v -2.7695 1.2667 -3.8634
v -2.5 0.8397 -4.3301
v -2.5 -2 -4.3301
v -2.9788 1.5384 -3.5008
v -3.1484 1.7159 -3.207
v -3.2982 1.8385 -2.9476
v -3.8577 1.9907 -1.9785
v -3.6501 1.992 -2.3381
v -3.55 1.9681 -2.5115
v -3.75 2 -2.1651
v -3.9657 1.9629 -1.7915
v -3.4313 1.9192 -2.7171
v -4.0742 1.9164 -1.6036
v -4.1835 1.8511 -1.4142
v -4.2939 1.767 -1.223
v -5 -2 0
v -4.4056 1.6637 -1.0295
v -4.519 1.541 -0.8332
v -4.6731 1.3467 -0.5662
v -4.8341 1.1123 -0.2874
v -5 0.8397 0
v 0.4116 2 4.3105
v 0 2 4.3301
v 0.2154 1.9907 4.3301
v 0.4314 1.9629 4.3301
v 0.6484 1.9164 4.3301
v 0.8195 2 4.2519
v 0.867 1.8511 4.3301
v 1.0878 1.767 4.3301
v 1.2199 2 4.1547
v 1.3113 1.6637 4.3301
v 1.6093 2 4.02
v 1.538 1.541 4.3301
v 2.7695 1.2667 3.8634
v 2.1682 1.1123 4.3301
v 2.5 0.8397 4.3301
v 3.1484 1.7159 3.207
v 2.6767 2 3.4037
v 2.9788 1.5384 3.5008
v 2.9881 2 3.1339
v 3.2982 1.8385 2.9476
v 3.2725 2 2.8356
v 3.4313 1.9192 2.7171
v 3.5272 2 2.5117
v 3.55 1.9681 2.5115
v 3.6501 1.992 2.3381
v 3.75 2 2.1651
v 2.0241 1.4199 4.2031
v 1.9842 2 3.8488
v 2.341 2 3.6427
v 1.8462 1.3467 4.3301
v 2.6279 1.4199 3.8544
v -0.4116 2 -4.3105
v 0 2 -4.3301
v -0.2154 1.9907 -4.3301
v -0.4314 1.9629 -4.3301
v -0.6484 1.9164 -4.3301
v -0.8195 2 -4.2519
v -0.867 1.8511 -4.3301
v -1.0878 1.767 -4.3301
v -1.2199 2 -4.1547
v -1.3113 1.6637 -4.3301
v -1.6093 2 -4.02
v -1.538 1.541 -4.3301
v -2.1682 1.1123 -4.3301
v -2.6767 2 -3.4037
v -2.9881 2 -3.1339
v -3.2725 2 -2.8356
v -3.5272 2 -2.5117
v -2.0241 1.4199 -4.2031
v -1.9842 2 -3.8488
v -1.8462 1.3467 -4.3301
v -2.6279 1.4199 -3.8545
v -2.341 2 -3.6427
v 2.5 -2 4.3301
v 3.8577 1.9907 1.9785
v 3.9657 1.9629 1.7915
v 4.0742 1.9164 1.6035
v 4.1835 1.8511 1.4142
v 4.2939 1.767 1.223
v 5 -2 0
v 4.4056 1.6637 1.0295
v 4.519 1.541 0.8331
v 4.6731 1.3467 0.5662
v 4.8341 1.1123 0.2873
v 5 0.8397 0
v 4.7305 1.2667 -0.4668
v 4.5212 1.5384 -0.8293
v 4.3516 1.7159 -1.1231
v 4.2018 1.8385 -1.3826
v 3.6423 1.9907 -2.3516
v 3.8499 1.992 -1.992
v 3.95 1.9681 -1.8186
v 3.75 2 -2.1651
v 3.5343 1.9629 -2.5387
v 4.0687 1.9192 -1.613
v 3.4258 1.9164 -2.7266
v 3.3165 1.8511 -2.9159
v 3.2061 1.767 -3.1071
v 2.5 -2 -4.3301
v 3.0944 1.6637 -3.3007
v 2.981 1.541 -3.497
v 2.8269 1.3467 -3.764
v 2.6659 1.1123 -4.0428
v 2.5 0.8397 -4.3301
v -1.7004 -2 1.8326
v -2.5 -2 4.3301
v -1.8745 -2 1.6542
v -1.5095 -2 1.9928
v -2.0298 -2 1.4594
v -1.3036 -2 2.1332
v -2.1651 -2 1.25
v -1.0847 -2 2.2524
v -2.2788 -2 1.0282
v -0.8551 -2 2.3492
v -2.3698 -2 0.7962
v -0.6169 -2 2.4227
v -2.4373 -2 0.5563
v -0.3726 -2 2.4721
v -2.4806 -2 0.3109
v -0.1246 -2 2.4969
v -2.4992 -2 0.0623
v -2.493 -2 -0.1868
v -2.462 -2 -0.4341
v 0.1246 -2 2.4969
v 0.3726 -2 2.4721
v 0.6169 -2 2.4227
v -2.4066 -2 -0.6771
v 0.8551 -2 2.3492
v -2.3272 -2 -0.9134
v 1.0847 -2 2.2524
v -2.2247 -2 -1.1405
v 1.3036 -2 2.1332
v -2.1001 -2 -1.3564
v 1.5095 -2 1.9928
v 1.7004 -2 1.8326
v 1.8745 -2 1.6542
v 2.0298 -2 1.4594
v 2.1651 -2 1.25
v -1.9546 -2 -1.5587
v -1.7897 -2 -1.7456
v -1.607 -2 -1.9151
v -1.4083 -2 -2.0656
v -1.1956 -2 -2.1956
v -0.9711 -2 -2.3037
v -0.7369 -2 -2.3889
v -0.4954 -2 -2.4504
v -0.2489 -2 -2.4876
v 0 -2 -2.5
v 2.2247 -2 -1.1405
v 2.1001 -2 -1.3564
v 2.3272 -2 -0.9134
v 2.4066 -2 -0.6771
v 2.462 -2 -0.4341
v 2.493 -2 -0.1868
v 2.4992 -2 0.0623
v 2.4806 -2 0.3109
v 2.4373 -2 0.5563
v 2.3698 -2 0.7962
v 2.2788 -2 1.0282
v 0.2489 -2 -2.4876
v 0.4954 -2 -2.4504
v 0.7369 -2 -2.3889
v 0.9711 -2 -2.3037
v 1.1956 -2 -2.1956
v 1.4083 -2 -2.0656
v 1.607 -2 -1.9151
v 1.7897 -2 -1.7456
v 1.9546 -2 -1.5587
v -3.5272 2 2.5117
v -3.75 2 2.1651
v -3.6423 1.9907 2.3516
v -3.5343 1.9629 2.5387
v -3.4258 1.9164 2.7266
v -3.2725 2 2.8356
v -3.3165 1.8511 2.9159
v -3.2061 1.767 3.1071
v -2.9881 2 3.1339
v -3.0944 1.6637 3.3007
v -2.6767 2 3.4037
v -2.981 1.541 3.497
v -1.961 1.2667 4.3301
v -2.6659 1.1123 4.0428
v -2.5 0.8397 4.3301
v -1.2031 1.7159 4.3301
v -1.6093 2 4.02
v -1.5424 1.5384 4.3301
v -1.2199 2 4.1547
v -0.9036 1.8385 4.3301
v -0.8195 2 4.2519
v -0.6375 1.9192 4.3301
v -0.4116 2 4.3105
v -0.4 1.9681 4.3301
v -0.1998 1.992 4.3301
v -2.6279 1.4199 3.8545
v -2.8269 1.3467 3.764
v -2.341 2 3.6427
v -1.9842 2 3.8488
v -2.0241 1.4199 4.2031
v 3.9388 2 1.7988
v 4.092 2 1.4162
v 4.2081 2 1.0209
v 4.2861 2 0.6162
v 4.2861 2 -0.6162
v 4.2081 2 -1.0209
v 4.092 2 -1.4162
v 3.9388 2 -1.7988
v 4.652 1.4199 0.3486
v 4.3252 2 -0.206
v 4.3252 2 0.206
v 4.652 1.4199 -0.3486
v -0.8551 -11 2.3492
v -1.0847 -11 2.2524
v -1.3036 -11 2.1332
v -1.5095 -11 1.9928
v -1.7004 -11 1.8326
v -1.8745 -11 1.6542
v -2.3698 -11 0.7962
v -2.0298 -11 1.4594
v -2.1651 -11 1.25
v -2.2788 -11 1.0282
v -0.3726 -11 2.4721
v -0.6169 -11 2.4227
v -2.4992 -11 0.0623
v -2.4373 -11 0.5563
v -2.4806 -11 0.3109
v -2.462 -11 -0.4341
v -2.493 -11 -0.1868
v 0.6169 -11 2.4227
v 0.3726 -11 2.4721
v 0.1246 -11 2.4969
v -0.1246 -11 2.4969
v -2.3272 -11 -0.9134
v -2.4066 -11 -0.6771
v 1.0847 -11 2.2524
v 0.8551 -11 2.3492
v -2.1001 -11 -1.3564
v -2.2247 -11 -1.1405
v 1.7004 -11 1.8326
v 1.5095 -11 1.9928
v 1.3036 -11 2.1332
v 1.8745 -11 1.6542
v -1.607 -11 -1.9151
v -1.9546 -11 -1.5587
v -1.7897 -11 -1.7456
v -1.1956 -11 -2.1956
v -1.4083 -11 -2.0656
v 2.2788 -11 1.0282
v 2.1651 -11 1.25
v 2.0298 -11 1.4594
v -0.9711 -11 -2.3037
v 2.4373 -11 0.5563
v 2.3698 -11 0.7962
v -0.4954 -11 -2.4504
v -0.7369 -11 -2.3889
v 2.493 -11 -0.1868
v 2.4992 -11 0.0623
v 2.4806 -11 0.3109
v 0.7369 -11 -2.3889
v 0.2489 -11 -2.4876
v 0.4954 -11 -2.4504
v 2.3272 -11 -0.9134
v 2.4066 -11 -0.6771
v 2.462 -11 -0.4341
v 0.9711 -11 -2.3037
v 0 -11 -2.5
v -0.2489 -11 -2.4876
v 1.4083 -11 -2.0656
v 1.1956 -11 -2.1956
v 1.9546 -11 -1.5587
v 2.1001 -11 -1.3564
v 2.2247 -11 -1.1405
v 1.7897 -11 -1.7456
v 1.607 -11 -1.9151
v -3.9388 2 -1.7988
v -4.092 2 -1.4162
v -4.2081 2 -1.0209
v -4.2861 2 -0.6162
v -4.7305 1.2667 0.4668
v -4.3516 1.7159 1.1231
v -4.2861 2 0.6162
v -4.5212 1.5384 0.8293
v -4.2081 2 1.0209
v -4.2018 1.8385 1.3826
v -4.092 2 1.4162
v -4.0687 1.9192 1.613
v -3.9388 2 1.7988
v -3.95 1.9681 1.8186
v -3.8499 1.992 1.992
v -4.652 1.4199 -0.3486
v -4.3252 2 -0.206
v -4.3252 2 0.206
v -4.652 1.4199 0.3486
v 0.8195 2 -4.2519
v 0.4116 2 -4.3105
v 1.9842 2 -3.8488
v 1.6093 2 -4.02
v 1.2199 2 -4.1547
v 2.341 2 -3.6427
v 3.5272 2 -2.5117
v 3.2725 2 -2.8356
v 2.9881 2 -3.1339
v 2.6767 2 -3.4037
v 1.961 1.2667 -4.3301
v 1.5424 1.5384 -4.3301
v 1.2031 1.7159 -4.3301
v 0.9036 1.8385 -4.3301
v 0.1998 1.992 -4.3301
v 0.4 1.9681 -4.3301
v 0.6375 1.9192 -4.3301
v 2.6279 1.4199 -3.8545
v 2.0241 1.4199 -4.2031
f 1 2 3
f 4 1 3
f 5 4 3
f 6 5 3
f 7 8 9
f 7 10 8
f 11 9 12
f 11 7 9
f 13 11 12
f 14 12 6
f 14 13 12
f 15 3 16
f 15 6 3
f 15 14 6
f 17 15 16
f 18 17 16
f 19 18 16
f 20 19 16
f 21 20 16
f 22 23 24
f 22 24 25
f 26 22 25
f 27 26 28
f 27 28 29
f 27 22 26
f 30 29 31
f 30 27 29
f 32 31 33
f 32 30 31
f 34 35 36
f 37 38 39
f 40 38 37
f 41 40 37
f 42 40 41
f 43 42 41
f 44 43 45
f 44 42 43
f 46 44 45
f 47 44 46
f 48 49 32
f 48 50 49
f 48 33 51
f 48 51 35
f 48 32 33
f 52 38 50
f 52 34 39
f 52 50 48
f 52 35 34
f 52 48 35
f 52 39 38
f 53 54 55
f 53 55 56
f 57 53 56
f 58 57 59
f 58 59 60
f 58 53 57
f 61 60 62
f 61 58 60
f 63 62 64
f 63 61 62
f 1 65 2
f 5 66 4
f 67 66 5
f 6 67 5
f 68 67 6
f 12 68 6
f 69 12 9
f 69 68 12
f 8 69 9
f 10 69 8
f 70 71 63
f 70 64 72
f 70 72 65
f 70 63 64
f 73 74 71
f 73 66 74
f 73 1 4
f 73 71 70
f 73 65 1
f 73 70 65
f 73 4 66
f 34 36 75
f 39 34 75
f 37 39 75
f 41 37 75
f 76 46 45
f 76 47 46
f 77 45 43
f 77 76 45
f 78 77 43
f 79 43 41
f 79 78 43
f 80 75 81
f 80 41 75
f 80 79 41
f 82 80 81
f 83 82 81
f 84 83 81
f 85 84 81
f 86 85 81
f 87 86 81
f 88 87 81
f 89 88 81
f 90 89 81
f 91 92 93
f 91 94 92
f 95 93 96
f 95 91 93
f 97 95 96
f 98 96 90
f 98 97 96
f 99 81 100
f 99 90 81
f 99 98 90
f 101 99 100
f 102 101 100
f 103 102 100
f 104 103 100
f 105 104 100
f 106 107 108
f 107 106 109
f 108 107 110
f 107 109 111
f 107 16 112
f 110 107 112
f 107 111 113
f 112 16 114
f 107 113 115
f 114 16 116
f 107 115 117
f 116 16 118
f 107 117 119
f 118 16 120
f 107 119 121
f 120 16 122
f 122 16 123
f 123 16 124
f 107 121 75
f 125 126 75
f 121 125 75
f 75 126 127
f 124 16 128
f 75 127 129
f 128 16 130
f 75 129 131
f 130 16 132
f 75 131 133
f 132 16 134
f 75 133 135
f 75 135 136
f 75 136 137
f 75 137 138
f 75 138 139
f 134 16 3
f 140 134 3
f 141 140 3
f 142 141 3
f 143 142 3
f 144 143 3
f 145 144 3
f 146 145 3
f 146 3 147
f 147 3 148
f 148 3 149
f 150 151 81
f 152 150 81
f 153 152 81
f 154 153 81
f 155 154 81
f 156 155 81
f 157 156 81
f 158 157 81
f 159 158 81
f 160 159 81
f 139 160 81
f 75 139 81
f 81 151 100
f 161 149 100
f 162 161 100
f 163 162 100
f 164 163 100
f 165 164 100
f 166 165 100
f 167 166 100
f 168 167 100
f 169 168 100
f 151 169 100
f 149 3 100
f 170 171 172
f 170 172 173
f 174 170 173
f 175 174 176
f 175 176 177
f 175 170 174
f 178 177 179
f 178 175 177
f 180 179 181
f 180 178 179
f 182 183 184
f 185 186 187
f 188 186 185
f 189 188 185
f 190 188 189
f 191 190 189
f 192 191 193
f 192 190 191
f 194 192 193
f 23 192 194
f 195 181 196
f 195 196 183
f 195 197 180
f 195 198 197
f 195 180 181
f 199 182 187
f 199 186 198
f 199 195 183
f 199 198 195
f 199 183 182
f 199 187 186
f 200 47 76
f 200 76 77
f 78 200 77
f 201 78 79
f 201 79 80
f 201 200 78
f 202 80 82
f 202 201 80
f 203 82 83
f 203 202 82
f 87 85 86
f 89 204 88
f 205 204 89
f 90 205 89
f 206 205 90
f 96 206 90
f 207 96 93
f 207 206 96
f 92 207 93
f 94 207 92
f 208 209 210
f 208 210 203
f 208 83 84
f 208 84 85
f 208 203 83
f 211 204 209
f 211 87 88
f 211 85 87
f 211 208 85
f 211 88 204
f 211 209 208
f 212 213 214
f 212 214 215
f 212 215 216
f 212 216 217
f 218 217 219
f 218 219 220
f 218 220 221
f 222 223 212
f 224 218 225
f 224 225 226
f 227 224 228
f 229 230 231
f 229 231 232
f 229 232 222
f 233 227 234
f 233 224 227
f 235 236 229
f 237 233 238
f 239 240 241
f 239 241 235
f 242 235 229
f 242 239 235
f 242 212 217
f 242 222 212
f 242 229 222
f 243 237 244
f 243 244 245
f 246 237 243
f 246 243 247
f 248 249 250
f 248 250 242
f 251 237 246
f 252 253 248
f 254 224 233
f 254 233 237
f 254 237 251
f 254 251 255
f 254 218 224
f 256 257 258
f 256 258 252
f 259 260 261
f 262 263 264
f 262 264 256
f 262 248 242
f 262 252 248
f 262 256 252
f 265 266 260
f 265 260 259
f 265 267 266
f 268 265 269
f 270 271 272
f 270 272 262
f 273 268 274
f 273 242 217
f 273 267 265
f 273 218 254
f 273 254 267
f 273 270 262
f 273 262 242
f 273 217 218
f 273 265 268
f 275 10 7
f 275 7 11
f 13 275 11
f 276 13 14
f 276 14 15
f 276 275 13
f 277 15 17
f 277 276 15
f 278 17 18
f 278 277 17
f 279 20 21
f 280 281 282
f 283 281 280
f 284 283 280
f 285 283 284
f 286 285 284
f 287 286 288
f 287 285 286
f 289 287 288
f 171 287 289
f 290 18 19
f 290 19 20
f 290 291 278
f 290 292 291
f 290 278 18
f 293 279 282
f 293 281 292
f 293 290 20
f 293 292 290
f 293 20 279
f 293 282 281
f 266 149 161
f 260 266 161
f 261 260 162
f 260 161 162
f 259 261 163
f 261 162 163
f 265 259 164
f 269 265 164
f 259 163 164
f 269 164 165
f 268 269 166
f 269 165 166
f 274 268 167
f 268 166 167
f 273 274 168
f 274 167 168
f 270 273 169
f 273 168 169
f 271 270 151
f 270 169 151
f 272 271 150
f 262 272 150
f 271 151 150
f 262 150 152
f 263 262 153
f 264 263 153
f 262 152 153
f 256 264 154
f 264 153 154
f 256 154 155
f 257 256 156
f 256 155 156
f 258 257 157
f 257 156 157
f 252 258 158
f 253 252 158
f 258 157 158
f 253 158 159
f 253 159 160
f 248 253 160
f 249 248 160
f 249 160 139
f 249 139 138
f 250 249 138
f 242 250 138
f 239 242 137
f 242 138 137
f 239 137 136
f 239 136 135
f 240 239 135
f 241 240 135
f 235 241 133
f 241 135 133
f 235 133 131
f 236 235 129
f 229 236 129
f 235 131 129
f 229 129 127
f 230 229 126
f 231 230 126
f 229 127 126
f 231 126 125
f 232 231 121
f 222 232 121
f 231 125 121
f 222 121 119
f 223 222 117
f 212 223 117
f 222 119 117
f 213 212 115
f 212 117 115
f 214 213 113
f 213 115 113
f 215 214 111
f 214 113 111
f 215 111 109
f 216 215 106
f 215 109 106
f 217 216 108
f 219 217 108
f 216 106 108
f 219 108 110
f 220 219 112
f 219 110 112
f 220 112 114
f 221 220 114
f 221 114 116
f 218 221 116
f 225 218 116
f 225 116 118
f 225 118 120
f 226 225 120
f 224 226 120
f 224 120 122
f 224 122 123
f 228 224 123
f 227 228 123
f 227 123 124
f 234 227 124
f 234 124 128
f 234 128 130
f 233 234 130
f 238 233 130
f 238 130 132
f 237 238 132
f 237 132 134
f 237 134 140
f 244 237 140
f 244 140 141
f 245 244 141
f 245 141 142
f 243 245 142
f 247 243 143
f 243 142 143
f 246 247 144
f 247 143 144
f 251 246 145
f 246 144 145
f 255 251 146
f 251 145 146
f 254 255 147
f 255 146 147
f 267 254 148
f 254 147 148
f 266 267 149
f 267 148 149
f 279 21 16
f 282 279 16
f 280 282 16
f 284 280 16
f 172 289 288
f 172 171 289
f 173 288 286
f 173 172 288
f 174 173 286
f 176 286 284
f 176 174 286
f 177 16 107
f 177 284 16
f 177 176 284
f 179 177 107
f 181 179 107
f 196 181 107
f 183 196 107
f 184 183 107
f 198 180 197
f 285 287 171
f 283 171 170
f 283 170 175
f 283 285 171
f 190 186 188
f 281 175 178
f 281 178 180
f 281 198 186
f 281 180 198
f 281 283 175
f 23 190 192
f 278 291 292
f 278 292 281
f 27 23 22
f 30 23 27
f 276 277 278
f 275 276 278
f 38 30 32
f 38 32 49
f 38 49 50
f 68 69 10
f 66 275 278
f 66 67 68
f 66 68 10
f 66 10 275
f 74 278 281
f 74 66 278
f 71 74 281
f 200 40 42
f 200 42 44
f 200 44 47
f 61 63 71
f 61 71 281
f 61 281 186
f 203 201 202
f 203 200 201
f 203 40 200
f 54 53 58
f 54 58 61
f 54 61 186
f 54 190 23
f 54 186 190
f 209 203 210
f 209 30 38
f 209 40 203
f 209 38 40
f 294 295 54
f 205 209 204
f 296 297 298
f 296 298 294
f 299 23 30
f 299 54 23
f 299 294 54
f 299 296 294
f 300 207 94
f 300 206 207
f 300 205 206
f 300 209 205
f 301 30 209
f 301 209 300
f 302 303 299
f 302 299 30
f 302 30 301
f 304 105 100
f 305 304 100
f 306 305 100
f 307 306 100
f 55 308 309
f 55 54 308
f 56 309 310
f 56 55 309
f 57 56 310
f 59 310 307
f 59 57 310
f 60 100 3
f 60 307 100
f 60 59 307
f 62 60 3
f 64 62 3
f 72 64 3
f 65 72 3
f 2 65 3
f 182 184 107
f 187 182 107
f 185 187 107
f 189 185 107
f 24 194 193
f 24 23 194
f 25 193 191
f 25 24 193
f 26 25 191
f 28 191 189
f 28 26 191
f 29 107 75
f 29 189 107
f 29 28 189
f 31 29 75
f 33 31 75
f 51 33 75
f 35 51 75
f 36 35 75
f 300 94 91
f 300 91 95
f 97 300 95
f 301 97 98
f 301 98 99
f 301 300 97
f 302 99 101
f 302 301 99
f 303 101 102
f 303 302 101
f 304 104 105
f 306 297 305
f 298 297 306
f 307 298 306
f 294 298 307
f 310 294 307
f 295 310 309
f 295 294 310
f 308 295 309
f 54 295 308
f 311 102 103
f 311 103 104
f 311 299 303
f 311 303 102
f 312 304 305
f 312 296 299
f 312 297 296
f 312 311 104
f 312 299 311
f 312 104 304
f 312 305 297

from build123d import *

# Parameters (mm, degrees)
BOSS_EXTRUDE1_DEPTH = 2
SKETCH2_OUTSIDE_W   = 24.844
SKETCH2_OUTSIDE_H   = 23.504
SKETCH2_OUTSIDE_R   = 4.330127019
CUT_EXTRUDE2_DEPTH  = 8.729812417
CUT_EXTRUDE2_DRAFT  = -30
SKETCH3_R           = 2.5
BOSS_EXTRUDE2_DEPTH = 9


with BuildPart() as part:
    # Sketch1 → Boss-Extrude1 (new, symmetric)
    with BuildSketch(Plane(origin=(0, 0, 0), x_dir=(1, 0, 0), z_dir=(0, 1, 0))):
        Polygon((5, 0), (2.5, 4.330127019), (-2.5, 4.330127019), (-5, 0), (-2.5, -4.330127019), (2.5, -4.330127019), align=None)
    extrude(amount=BOSS_EXTRUDE1_DEPTH, both=True)


with BuildPart() as cut_extrude2_tool:
    # Sketch2 outside → Cut-Extrude2 (with draft: the straight prism first)
    with BuildSketch(Plane(origin=(0, 2, 0), x_dir=(1, 0, 0), z_dir=(0, 1, 0))):
        Rectangle(SKETCH2_OUTSIDE_W, SKETCH2_OUTSIDE_H)
        Circle(SKETCH2_OUTSIDE_R, mode=Mode.SUBTRACT)
    extrude(amount=-CUT_EXTRUDE2_DEPTH)
    # Cut-Extrude2: the draft: its side faces are tilted about the plane it starts from
    cut_extrude2_sides = [cut_extrude2_tool.faces().sort_by_distance(p)[0] for p in [
        (0, -2.364906208, 11.752),
        (12.422, -2.364906208, 0),
        (0, -2.364906208, -11.752),
        (-12.422, -2.364906208, 0),
        (-4.330127019, -2.364906208, 0),
    ]]
    draft(cut_extrude2_sides, Plane(origin=(0, 2, 0), x_dir=(1, 0, 0), z_dir=(0, 1, 0)), CUT_EXTRUDE2_DRAFT)


with BuildPart() as part_1:
    add(part.part)

    # Cut-Extrude2: cut by cut_extrude2_tool
    add(cut_extrude2_tool.part, mode=Mode.SUBTRACT)

    # Sketch3 → Boss-Extrude2 (add)
    with BuildSketch(Plane.XZ.offset(2)):
        with Locations(Location((0, 0, 0), (0, 0, 270))):
            Circle(SKETCH3_R)
    extrude(amount=BOSS_EXTRUDE2_DEPTH)


solid = part_1.part
